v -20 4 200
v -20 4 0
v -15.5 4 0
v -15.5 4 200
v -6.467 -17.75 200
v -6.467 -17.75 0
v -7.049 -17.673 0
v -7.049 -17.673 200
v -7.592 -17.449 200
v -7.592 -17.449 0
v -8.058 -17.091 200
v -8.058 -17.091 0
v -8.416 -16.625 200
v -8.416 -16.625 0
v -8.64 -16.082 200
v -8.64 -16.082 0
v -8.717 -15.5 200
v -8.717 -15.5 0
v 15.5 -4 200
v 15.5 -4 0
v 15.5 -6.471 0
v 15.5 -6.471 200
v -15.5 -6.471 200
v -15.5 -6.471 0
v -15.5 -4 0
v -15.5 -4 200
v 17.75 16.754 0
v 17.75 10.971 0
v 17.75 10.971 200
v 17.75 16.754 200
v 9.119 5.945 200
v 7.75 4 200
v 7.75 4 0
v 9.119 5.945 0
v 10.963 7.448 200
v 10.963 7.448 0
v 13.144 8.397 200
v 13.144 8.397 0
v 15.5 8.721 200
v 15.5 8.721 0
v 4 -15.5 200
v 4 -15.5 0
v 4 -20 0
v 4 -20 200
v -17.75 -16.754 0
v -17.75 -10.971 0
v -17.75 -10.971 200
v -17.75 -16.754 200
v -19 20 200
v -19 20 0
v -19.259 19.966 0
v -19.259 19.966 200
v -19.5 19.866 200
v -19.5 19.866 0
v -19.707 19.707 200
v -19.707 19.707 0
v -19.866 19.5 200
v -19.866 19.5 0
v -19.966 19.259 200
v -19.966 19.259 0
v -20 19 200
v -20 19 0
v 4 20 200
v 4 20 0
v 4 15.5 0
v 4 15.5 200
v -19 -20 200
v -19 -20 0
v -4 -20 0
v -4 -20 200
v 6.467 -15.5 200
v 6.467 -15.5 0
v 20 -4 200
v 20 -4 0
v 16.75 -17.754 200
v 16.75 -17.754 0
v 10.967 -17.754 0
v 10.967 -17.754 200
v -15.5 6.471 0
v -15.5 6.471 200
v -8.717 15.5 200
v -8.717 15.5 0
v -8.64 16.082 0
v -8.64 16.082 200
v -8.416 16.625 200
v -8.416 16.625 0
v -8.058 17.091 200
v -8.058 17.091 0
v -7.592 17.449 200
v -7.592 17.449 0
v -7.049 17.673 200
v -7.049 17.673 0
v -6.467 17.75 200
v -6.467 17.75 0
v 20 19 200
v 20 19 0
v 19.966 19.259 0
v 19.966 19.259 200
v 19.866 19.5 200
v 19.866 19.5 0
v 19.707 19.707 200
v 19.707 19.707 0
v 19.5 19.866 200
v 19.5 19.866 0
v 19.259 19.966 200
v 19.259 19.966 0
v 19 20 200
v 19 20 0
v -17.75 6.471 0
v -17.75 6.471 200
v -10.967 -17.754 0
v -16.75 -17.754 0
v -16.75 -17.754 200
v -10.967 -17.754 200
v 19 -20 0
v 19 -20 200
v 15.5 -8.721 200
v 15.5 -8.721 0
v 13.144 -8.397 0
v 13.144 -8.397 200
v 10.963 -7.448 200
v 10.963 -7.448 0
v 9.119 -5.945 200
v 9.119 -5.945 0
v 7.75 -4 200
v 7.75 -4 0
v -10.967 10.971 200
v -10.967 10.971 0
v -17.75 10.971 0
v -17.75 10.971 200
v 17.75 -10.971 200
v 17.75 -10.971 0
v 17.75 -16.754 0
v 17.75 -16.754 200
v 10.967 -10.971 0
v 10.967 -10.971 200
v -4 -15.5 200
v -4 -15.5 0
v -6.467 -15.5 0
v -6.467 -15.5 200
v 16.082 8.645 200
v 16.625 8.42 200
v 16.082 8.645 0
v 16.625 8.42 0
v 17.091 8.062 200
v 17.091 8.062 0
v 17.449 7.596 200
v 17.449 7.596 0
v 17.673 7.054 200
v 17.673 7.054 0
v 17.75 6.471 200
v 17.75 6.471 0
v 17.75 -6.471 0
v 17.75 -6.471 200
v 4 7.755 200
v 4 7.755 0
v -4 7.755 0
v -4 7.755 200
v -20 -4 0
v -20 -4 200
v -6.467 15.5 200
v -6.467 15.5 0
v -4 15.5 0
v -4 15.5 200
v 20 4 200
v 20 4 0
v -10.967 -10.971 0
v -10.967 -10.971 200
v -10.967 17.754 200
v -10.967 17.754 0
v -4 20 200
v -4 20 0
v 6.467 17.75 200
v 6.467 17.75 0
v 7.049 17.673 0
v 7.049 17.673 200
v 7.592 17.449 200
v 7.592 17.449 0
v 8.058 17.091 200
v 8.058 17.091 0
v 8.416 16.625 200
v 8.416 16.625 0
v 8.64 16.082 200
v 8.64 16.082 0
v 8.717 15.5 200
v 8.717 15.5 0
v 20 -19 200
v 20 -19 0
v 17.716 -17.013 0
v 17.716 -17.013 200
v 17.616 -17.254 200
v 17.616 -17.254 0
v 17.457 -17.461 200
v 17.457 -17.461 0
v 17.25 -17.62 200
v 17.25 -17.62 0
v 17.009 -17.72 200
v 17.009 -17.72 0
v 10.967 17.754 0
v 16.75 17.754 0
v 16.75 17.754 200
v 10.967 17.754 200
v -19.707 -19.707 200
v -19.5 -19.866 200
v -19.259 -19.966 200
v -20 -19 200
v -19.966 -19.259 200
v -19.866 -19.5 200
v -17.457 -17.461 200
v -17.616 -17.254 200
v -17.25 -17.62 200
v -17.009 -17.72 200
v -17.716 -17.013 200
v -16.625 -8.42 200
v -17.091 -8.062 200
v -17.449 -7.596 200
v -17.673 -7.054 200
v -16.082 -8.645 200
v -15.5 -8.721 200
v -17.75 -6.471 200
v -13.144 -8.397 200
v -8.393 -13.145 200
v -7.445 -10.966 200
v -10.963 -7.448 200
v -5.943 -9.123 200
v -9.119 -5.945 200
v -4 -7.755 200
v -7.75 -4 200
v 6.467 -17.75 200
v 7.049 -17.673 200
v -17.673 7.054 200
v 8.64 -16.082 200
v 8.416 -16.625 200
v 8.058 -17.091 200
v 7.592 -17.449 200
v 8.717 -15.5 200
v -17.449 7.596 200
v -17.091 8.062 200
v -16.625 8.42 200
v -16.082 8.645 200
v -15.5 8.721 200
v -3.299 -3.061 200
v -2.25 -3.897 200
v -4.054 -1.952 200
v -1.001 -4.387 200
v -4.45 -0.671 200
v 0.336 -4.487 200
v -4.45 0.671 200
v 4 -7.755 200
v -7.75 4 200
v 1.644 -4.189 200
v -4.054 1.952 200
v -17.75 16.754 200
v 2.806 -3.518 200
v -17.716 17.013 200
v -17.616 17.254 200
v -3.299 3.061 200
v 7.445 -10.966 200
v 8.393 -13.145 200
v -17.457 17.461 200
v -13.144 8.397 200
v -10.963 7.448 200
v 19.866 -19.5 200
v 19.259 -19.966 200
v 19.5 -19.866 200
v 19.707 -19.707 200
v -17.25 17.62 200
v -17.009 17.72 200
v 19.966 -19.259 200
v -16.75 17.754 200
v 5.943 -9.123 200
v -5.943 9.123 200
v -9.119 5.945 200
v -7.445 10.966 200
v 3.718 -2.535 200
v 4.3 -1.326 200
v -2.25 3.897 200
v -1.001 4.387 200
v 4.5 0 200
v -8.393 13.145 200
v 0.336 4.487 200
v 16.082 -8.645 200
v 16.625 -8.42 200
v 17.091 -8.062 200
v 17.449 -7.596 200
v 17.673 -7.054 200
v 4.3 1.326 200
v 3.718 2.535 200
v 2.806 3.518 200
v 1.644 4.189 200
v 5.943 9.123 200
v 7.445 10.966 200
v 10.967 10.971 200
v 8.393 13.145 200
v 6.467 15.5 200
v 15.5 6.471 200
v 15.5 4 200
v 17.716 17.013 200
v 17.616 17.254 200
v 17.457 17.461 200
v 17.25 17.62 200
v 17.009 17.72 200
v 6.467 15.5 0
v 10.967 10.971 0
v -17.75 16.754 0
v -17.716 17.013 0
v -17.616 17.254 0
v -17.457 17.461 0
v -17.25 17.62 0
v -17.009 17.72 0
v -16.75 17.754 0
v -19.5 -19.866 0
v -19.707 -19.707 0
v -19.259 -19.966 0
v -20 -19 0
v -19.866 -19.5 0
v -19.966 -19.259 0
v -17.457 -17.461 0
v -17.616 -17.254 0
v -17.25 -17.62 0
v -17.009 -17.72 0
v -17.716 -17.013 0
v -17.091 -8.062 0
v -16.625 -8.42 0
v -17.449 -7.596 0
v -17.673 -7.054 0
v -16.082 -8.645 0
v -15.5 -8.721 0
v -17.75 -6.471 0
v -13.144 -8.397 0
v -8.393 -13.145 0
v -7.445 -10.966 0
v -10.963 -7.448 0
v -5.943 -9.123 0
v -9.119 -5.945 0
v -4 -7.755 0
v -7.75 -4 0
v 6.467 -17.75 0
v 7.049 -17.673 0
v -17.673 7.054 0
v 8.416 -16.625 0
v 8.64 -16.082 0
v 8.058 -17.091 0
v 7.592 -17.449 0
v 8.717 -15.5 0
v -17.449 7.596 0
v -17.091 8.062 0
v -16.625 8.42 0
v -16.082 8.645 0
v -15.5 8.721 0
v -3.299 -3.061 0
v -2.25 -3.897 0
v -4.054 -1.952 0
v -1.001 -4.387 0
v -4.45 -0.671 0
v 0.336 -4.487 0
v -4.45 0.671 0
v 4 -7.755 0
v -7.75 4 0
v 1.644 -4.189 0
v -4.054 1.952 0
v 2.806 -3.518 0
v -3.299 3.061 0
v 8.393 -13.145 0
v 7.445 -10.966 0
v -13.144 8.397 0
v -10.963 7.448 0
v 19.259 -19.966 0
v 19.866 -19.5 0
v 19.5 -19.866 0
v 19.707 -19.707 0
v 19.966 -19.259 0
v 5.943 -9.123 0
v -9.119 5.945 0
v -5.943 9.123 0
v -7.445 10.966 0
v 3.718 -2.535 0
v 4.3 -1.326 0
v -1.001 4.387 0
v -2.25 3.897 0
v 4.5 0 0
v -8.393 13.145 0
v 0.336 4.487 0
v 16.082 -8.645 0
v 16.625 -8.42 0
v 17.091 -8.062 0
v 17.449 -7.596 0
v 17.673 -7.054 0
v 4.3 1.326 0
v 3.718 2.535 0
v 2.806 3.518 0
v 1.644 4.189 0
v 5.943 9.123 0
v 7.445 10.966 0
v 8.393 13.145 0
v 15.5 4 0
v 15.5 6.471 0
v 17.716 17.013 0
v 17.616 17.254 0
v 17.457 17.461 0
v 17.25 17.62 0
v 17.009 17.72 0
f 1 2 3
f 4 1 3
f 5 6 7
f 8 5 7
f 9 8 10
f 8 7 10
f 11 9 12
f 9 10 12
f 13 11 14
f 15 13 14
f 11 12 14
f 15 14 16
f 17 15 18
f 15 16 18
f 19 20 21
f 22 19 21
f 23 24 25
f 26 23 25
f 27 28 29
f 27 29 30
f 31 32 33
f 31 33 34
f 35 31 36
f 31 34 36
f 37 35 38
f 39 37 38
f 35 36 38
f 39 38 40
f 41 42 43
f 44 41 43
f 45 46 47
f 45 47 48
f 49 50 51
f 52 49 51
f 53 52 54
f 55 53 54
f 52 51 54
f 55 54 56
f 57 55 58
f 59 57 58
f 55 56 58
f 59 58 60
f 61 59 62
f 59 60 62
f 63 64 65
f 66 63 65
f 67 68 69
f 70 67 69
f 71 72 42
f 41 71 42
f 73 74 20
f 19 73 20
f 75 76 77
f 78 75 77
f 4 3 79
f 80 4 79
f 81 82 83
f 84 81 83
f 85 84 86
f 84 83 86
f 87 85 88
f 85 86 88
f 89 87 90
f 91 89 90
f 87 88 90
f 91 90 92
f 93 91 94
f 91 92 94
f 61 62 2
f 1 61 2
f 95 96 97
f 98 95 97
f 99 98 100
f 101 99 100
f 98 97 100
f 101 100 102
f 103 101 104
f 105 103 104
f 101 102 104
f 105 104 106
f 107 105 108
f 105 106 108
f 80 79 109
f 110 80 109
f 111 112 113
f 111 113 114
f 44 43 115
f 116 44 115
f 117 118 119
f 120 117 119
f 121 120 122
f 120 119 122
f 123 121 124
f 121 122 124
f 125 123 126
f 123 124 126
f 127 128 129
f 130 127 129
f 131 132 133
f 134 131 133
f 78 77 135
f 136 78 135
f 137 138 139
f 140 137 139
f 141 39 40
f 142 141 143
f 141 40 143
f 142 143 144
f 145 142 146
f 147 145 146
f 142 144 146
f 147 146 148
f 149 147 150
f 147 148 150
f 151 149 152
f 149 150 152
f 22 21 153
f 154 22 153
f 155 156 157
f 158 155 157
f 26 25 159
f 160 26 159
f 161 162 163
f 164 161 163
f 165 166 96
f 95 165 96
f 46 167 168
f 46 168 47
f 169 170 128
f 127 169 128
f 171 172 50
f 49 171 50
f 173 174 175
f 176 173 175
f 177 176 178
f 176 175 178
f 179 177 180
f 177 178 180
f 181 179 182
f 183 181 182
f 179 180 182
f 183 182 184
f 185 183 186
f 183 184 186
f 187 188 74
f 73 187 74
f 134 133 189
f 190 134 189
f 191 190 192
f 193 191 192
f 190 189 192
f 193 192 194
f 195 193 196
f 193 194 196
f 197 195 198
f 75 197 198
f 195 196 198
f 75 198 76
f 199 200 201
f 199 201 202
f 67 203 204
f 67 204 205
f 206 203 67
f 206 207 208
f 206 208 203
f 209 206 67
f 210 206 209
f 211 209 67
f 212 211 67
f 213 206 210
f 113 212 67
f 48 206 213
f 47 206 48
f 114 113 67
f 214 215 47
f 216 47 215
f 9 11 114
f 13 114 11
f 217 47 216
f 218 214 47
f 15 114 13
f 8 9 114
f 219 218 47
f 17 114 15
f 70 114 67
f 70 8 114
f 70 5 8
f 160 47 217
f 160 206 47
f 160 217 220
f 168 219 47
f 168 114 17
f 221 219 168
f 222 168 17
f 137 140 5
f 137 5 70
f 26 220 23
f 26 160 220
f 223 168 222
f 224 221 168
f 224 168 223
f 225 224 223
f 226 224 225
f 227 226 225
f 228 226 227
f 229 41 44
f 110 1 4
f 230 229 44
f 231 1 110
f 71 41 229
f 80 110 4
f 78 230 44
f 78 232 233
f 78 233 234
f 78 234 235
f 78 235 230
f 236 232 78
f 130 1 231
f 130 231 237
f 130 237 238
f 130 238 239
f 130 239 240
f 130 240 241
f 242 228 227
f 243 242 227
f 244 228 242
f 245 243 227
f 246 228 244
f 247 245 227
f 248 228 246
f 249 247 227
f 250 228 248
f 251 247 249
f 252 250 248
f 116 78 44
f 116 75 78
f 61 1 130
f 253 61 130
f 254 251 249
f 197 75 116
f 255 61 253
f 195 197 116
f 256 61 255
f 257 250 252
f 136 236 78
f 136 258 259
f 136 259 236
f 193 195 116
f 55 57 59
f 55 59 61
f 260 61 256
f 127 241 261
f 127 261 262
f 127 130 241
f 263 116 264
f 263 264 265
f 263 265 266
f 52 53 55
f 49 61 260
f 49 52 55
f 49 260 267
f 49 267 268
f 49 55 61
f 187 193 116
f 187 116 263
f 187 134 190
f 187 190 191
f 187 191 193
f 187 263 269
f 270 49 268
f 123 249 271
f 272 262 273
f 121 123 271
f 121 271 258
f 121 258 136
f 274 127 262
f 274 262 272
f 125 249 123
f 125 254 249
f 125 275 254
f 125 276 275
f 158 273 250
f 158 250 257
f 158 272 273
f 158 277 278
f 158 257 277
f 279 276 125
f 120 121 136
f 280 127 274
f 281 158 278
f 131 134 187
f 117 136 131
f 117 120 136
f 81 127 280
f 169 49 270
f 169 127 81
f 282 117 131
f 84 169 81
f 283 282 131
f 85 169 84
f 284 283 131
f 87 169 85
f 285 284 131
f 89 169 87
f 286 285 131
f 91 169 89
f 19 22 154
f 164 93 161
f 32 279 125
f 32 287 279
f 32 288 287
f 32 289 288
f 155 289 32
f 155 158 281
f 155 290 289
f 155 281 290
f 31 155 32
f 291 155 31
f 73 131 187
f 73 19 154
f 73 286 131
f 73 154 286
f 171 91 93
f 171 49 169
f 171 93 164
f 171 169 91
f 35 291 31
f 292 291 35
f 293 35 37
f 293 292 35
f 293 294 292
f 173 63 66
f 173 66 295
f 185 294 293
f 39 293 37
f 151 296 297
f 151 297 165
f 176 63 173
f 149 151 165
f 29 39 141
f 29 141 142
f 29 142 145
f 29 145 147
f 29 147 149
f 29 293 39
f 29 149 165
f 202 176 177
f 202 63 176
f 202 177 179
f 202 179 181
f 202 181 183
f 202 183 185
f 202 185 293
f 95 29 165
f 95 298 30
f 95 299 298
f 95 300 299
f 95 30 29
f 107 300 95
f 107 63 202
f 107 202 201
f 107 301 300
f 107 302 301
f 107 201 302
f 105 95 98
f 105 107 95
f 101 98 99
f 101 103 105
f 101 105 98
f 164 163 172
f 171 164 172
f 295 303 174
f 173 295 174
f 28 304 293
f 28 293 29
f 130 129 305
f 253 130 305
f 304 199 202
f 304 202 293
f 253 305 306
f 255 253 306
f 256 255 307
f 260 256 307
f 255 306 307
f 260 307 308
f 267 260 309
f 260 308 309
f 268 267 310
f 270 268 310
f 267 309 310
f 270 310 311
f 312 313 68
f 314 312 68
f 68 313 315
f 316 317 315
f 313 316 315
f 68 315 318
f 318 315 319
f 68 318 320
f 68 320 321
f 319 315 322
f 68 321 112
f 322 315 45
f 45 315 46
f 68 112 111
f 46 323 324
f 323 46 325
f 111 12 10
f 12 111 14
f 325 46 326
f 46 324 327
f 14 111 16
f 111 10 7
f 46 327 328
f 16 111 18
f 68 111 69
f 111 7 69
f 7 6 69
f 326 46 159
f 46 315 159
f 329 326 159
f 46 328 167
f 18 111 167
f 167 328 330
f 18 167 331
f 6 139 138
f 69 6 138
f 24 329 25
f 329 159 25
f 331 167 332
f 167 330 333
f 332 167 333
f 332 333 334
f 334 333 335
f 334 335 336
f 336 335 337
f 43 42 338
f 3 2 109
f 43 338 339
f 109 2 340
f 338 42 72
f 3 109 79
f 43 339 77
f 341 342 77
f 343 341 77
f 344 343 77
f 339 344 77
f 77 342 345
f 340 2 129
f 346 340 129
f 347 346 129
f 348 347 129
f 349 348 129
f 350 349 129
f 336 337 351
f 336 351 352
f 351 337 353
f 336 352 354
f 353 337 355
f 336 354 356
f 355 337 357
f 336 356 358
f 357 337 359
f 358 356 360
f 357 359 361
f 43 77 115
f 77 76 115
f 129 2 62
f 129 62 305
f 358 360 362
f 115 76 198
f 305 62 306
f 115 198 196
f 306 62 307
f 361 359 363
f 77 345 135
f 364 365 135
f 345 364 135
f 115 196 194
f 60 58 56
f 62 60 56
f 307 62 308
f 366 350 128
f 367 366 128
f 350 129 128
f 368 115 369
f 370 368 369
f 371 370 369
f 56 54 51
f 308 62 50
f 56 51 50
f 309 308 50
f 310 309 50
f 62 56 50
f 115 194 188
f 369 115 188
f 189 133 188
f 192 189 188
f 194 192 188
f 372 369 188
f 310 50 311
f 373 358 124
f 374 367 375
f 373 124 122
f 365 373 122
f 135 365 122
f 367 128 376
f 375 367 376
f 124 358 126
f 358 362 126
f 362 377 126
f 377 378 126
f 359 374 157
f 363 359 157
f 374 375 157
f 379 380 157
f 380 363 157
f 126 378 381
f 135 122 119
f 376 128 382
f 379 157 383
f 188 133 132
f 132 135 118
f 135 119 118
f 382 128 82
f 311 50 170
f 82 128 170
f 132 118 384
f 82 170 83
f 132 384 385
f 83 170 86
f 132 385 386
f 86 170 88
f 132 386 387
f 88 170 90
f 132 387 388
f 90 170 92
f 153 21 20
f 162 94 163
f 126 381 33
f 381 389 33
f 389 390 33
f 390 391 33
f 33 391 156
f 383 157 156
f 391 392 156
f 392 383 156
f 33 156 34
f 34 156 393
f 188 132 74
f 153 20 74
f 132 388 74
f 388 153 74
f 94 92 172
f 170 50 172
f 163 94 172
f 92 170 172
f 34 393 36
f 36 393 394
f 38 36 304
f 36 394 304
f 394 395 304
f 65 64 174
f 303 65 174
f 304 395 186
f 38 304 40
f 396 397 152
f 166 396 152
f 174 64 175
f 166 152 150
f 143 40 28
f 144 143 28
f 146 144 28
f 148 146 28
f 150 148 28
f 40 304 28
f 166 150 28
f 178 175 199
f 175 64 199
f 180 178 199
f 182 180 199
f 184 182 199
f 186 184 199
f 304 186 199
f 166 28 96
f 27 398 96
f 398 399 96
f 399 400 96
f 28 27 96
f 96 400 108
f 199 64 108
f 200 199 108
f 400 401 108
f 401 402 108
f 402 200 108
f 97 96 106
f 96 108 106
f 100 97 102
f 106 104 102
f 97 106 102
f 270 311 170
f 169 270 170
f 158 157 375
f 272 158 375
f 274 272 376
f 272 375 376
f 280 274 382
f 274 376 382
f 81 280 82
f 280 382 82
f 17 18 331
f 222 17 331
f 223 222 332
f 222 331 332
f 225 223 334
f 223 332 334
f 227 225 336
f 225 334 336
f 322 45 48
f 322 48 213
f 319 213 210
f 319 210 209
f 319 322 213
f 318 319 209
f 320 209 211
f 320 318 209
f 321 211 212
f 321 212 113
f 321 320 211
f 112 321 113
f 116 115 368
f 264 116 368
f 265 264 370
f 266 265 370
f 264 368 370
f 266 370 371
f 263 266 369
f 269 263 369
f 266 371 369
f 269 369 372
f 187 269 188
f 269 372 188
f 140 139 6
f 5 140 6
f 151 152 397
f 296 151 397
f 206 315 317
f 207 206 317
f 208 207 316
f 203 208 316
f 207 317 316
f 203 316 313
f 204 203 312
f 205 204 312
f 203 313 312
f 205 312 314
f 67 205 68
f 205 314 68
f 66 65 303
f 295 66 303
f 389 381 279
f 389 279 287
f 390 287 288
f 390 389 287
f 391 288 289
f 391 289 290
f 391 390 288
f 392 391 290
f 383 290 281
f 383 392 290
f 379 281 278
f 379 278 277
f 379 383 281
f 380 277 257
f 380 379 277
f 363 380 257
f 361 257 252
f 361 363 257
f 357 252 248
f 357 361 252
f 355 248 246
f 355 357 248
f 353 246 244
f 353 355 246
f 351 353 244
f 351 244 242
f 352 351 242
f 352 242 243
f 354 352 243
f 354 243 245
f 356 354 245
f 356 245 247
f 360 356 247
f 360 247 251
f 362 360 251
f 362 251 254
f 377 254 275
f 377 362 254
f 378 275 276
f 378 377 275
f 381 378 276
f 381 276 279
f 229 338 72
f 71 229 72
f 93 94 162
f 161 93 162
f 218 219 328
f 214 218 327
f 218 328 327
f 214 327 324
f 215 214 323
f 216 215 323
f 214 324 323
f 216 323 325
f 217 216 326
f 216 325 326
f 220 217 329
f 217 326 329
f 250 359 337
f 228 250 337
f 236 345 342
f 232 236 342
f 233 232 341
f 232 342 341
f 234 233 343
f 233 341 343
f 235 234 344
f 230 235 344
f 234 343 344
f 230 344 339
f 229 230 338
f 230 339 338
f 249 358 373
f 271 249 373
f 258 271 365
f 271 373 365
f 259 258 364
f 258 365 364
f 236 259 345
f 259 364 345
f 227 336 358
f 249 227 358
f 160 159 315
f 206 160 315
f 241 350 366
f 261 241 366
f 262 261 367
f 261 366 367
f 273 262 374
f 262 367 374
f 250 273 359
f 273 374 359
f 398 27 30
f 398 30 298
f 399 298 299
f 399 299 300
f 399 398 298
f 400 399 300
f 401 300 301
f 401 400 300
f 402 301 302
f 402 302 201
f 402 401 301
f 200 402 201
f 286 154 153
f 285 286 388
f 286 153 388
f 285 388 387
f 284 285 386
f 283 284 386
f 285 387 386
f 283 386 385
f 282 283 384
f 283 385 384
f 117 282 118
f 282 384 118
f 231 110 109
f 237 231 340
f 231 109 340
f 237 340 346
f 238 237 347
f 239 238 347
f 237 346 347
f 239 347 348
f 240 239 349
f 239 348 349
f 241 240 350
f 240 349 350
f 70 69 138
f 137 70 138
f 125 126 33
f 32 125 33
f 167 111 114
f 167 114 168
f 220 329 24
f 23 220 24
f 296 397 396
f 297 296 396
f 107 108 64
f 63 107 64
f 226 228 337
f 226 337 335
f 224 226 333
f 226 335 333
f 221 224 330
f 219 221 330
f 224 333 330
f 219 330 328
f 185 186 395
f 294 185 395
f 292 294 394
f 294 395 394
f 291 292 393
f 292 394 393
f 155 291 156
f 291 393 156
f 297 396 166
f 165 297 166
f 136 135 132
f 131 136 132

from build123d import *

# Parameters (mm, degrees)
SZKIC1_R                    = 4.5
DODANIE_WYCI_GNI_CIE1_DEPTH = 200


with BuildPart() as part:
    # Szkic1 → Dodanie-wyciągnięcie1 (new body)
    with BuildSketch(Plane.XY):
        with BuildLine():
            Line((4, 7.75478035), (-4, 7.75478035))
            ThreePointArc((-4, 7.75478035), (-7.445030717, 10.96569241), (-8.717134168, 15.500000044))
            ThreePointArc((-8.717134168, 15.500000044), (-8.058124425, 17.090990301), (-6.467134168, 17.750000044))
            Line((-6.467134168, 17.750000044), (-6.467134168, 15.500000044))
            Line((-6.467134168, 15.500000044), (-4, 15.500000044))
            Line((-4, 15.500000044), (-4, 20.000000044))
            Line((-4, 20.000000044), (-19, 20.000000044))
            ThreePointArc((-19, 20.000000044), (-19.707106812, 19.707106812), (-20.000000044, 19))
            Line((-20.000000044, 19), (-20.000000044, 4))
            Line((-20.000000044, 4), (-15.500000044, 4))
            Line((-15.500000044, 4), (-15.500000044, 6.471381771))
            Line((-15.500000044, 6.471381771), (-17.750000044, 6.471381771))
            ThreePointArc((-17.750000044, 6.471381771), (-17.090990301, 8.062372029), (-15.500000044, 8.721381771))
            ThreePointArc((-15.500000044, 8.721381771), (-10.962546302, 7.448087912), (-7.750000044, 4))
            Line((-7.750000044, 4), (-7.750000044, -4))
            ThreePointArc((-7.750000044, -4), (-10.962546302, -7.448087912), (-15.500000044, -8.721381771))
            ThreePointArc((-15.500000044, -8.721381771), (-17.090990301, -8.062372029), (-17.750000044, -6.471381771))
            Line((-17.750000044, -6.471381771), (-15.500000044, -6.471381771))
            Line((-15.500000044, -6.471381771), (-15.500000044, -4))
            Line((-15.500000044, -4), (-20.000000044, -4))
            Line((-20.000000044, -4), (-20.000000044, -19))
            ThreePointArc((-20.000000044, -19), (-19.707106812, -19.707106812), (-19, -20.000000044))
            Line((-19, -20.000000044), (-4, -20.000000044))
            Line((-4, -20.000000044), (-4, -15.500000044))
            Line((-4, -15.500000044), (-6.467134168, -15.500000044))
            Line((-6.467134168, -15.500000044), (-6.467134168, -17.750000044))
            ThreePointArc((-6.467134168, -17.750000044), (-8.058124425, -17.090990301), (-8.717134168, -15.500000044))
            ThreePointArc((-8.717134168, -15.500000044), (-7.445030717, -10.96569241), (-4, -7.75478035))
            Line((-4, -7.75478035), (4, -7.75478035))
            ThreePointArc((4, -7.75478035), (7.445030717, -10.96569241), (8.717134168, -15.500000044))
            ThreePointArc((8.717134168, -15.500000044), (8.058124425, -17.090990301), (6.467134168, -17.750000044))
            Line((6.467134168, -17.750000044), (6.467134168, -15.500000044))
            Line((6.467134168, -15.500000044), (4, -15.500000044))
            Line((4, -15.500000044), (4, -20.000000044))
            Line((4, -20.000000044), (19, -20.000000044))
            ThreePointArc((19, -20.000000044), (19.707106812, -19.707106812), (20.000000044, -19))
            Line((20.000000044, -19), (20.000000044, -4))
            Line((20.000000044, -4), (15.500000044, -4))
            Line((15.500000044, -4), (15.500000044, -6.471381771))
            Line((15.500000044, -6.471381771), (17.750000044, -6.471381771))
            ThreePointArc((17.750000044, -6.471381771), (17.090990301, -8.062372029), (15.500000044, -8.721381771))
            ThreePointArc((15.500000044, -8.721381771), (10.962546302, -7.448087912), (7.750000044, -4))
            Line((7.750000044, -4), (7.750000044, 4))
            ThreePointArc((7.750000044, 4), (10.962546302, 7.448087912), (15.500000044, 8.721381771))
            ThreePointArc((15.500000044, 8.721381771), (17.090990301, 8.062372029), (17.750000044, 6.471381771))
            Line((17.750000044, 6.471381771), (15.500000044, 6.471381771))
            Line((15.500000044, 6.471381771), (15.500000044, 4))
            Line((15.500000044, 4), (20.000000044, 4))
            Line((20.000000044, 4), (20.000000044, 19))
            ThreePointArc((20.000000044, 19), (19.707106812, 19.707106812), (19, 20.000000044))
            Line((19, 20.000000044), (4, 20.000000044))
            Line((4, 20.000000044), (4, 15.500000044))
            Line((4, 15.500000044), (6.467134168, 15.500000044))
            Line((6.467134168, 15.500000044), (6.467134168, 17.750000044))
            ThreePointArc((6.467134168, 17.750000044), (8.058124425, 17.090990301), (8.717134168, 15.500000044))
            ThreePointArc((8.717134168, 15.500000044), (7.445030717, 10.96569241), (4, 7.75478035))
        make_face()
        Circle(SZKIC1_R, mode=Mode.SUBTRACT)
        with BuildLine():
            Line((-17.750000044, 10.971381771), (-17.750000044, 16.754247647))
            ThreePointArc((-17.750000044, 16.754247647), (-17.457106825, 17.461354428), (-16.750000044, 17.754247647))
            Line((-16.750000044, 17.754247647), (-10.967134168, 17.754247647))
            Line((-10.967134168, 17.754247647), (-10.967134168, 10.971381771))
            Line((-10.967134168, 10.971381771), (-17.750000044, 10.971381771))
        make_face(mode=Mode.SUBTRACT)
        with BuildLine():
            Line((10.967134168, 10.971381771), (17.750000044, 10.971381771))
            Line((17.750000044, 10.971381771), (17.750000044, 16.754247647))
            ThreePointArc((17.750000044, 16.754247647), (17.457106825, 17.461354428), (16.750000044, 17.754247647))
            Line((16.750000044, 17.754247647), (10.967134168, 17.754247647))
            Line((10.967134168, 17.754247647), (10.967134168, 10.971381771))
        make_face(mode=Mode.SUBTRACT)
        with BuildLine():
            Line((17.750000044, -10.971381771), (17.750000044, -16.754247647))
            ThreePointArc((17.750000044, -16.754247647), (17.457106825, -17.461354428), (16.750000044, -17.754247647))
            Line((16.750000044, -17.754247647), (10.967134168, -17.754247647))
            Line((10.967134168, -17.754247647), (10.967134168, -10.971381771))
            Line((10.967134168, -10.971381771), (17.750000044, -10.971381771))
        make_face(mode=Mode.SUBTRACT)
        with BuildLine():
            Line((-10.967134168, -10.971381771), (-17.750000044, -10.971381771))
            Line((-17.750000044, -10.971381771), (-17.750000044, -16.754247647))
            ThreePointArc((-17.750000044, -16.754247647), (-17.457106825, -17.461354428), (-16.750000044, -17.754247647))
            Line((-16.750000044, -17.754247647), (-10.967134168, -17.754247647))
            Line((-10.967134168, -17.754247647), (-10.967134168, -10.971381771))
        make_face(mode=Mode.SUBTRACT)
    extrude(amount=DODANIE_WYCI_GNI_CIE1_DEPTH)


solid = part.part
